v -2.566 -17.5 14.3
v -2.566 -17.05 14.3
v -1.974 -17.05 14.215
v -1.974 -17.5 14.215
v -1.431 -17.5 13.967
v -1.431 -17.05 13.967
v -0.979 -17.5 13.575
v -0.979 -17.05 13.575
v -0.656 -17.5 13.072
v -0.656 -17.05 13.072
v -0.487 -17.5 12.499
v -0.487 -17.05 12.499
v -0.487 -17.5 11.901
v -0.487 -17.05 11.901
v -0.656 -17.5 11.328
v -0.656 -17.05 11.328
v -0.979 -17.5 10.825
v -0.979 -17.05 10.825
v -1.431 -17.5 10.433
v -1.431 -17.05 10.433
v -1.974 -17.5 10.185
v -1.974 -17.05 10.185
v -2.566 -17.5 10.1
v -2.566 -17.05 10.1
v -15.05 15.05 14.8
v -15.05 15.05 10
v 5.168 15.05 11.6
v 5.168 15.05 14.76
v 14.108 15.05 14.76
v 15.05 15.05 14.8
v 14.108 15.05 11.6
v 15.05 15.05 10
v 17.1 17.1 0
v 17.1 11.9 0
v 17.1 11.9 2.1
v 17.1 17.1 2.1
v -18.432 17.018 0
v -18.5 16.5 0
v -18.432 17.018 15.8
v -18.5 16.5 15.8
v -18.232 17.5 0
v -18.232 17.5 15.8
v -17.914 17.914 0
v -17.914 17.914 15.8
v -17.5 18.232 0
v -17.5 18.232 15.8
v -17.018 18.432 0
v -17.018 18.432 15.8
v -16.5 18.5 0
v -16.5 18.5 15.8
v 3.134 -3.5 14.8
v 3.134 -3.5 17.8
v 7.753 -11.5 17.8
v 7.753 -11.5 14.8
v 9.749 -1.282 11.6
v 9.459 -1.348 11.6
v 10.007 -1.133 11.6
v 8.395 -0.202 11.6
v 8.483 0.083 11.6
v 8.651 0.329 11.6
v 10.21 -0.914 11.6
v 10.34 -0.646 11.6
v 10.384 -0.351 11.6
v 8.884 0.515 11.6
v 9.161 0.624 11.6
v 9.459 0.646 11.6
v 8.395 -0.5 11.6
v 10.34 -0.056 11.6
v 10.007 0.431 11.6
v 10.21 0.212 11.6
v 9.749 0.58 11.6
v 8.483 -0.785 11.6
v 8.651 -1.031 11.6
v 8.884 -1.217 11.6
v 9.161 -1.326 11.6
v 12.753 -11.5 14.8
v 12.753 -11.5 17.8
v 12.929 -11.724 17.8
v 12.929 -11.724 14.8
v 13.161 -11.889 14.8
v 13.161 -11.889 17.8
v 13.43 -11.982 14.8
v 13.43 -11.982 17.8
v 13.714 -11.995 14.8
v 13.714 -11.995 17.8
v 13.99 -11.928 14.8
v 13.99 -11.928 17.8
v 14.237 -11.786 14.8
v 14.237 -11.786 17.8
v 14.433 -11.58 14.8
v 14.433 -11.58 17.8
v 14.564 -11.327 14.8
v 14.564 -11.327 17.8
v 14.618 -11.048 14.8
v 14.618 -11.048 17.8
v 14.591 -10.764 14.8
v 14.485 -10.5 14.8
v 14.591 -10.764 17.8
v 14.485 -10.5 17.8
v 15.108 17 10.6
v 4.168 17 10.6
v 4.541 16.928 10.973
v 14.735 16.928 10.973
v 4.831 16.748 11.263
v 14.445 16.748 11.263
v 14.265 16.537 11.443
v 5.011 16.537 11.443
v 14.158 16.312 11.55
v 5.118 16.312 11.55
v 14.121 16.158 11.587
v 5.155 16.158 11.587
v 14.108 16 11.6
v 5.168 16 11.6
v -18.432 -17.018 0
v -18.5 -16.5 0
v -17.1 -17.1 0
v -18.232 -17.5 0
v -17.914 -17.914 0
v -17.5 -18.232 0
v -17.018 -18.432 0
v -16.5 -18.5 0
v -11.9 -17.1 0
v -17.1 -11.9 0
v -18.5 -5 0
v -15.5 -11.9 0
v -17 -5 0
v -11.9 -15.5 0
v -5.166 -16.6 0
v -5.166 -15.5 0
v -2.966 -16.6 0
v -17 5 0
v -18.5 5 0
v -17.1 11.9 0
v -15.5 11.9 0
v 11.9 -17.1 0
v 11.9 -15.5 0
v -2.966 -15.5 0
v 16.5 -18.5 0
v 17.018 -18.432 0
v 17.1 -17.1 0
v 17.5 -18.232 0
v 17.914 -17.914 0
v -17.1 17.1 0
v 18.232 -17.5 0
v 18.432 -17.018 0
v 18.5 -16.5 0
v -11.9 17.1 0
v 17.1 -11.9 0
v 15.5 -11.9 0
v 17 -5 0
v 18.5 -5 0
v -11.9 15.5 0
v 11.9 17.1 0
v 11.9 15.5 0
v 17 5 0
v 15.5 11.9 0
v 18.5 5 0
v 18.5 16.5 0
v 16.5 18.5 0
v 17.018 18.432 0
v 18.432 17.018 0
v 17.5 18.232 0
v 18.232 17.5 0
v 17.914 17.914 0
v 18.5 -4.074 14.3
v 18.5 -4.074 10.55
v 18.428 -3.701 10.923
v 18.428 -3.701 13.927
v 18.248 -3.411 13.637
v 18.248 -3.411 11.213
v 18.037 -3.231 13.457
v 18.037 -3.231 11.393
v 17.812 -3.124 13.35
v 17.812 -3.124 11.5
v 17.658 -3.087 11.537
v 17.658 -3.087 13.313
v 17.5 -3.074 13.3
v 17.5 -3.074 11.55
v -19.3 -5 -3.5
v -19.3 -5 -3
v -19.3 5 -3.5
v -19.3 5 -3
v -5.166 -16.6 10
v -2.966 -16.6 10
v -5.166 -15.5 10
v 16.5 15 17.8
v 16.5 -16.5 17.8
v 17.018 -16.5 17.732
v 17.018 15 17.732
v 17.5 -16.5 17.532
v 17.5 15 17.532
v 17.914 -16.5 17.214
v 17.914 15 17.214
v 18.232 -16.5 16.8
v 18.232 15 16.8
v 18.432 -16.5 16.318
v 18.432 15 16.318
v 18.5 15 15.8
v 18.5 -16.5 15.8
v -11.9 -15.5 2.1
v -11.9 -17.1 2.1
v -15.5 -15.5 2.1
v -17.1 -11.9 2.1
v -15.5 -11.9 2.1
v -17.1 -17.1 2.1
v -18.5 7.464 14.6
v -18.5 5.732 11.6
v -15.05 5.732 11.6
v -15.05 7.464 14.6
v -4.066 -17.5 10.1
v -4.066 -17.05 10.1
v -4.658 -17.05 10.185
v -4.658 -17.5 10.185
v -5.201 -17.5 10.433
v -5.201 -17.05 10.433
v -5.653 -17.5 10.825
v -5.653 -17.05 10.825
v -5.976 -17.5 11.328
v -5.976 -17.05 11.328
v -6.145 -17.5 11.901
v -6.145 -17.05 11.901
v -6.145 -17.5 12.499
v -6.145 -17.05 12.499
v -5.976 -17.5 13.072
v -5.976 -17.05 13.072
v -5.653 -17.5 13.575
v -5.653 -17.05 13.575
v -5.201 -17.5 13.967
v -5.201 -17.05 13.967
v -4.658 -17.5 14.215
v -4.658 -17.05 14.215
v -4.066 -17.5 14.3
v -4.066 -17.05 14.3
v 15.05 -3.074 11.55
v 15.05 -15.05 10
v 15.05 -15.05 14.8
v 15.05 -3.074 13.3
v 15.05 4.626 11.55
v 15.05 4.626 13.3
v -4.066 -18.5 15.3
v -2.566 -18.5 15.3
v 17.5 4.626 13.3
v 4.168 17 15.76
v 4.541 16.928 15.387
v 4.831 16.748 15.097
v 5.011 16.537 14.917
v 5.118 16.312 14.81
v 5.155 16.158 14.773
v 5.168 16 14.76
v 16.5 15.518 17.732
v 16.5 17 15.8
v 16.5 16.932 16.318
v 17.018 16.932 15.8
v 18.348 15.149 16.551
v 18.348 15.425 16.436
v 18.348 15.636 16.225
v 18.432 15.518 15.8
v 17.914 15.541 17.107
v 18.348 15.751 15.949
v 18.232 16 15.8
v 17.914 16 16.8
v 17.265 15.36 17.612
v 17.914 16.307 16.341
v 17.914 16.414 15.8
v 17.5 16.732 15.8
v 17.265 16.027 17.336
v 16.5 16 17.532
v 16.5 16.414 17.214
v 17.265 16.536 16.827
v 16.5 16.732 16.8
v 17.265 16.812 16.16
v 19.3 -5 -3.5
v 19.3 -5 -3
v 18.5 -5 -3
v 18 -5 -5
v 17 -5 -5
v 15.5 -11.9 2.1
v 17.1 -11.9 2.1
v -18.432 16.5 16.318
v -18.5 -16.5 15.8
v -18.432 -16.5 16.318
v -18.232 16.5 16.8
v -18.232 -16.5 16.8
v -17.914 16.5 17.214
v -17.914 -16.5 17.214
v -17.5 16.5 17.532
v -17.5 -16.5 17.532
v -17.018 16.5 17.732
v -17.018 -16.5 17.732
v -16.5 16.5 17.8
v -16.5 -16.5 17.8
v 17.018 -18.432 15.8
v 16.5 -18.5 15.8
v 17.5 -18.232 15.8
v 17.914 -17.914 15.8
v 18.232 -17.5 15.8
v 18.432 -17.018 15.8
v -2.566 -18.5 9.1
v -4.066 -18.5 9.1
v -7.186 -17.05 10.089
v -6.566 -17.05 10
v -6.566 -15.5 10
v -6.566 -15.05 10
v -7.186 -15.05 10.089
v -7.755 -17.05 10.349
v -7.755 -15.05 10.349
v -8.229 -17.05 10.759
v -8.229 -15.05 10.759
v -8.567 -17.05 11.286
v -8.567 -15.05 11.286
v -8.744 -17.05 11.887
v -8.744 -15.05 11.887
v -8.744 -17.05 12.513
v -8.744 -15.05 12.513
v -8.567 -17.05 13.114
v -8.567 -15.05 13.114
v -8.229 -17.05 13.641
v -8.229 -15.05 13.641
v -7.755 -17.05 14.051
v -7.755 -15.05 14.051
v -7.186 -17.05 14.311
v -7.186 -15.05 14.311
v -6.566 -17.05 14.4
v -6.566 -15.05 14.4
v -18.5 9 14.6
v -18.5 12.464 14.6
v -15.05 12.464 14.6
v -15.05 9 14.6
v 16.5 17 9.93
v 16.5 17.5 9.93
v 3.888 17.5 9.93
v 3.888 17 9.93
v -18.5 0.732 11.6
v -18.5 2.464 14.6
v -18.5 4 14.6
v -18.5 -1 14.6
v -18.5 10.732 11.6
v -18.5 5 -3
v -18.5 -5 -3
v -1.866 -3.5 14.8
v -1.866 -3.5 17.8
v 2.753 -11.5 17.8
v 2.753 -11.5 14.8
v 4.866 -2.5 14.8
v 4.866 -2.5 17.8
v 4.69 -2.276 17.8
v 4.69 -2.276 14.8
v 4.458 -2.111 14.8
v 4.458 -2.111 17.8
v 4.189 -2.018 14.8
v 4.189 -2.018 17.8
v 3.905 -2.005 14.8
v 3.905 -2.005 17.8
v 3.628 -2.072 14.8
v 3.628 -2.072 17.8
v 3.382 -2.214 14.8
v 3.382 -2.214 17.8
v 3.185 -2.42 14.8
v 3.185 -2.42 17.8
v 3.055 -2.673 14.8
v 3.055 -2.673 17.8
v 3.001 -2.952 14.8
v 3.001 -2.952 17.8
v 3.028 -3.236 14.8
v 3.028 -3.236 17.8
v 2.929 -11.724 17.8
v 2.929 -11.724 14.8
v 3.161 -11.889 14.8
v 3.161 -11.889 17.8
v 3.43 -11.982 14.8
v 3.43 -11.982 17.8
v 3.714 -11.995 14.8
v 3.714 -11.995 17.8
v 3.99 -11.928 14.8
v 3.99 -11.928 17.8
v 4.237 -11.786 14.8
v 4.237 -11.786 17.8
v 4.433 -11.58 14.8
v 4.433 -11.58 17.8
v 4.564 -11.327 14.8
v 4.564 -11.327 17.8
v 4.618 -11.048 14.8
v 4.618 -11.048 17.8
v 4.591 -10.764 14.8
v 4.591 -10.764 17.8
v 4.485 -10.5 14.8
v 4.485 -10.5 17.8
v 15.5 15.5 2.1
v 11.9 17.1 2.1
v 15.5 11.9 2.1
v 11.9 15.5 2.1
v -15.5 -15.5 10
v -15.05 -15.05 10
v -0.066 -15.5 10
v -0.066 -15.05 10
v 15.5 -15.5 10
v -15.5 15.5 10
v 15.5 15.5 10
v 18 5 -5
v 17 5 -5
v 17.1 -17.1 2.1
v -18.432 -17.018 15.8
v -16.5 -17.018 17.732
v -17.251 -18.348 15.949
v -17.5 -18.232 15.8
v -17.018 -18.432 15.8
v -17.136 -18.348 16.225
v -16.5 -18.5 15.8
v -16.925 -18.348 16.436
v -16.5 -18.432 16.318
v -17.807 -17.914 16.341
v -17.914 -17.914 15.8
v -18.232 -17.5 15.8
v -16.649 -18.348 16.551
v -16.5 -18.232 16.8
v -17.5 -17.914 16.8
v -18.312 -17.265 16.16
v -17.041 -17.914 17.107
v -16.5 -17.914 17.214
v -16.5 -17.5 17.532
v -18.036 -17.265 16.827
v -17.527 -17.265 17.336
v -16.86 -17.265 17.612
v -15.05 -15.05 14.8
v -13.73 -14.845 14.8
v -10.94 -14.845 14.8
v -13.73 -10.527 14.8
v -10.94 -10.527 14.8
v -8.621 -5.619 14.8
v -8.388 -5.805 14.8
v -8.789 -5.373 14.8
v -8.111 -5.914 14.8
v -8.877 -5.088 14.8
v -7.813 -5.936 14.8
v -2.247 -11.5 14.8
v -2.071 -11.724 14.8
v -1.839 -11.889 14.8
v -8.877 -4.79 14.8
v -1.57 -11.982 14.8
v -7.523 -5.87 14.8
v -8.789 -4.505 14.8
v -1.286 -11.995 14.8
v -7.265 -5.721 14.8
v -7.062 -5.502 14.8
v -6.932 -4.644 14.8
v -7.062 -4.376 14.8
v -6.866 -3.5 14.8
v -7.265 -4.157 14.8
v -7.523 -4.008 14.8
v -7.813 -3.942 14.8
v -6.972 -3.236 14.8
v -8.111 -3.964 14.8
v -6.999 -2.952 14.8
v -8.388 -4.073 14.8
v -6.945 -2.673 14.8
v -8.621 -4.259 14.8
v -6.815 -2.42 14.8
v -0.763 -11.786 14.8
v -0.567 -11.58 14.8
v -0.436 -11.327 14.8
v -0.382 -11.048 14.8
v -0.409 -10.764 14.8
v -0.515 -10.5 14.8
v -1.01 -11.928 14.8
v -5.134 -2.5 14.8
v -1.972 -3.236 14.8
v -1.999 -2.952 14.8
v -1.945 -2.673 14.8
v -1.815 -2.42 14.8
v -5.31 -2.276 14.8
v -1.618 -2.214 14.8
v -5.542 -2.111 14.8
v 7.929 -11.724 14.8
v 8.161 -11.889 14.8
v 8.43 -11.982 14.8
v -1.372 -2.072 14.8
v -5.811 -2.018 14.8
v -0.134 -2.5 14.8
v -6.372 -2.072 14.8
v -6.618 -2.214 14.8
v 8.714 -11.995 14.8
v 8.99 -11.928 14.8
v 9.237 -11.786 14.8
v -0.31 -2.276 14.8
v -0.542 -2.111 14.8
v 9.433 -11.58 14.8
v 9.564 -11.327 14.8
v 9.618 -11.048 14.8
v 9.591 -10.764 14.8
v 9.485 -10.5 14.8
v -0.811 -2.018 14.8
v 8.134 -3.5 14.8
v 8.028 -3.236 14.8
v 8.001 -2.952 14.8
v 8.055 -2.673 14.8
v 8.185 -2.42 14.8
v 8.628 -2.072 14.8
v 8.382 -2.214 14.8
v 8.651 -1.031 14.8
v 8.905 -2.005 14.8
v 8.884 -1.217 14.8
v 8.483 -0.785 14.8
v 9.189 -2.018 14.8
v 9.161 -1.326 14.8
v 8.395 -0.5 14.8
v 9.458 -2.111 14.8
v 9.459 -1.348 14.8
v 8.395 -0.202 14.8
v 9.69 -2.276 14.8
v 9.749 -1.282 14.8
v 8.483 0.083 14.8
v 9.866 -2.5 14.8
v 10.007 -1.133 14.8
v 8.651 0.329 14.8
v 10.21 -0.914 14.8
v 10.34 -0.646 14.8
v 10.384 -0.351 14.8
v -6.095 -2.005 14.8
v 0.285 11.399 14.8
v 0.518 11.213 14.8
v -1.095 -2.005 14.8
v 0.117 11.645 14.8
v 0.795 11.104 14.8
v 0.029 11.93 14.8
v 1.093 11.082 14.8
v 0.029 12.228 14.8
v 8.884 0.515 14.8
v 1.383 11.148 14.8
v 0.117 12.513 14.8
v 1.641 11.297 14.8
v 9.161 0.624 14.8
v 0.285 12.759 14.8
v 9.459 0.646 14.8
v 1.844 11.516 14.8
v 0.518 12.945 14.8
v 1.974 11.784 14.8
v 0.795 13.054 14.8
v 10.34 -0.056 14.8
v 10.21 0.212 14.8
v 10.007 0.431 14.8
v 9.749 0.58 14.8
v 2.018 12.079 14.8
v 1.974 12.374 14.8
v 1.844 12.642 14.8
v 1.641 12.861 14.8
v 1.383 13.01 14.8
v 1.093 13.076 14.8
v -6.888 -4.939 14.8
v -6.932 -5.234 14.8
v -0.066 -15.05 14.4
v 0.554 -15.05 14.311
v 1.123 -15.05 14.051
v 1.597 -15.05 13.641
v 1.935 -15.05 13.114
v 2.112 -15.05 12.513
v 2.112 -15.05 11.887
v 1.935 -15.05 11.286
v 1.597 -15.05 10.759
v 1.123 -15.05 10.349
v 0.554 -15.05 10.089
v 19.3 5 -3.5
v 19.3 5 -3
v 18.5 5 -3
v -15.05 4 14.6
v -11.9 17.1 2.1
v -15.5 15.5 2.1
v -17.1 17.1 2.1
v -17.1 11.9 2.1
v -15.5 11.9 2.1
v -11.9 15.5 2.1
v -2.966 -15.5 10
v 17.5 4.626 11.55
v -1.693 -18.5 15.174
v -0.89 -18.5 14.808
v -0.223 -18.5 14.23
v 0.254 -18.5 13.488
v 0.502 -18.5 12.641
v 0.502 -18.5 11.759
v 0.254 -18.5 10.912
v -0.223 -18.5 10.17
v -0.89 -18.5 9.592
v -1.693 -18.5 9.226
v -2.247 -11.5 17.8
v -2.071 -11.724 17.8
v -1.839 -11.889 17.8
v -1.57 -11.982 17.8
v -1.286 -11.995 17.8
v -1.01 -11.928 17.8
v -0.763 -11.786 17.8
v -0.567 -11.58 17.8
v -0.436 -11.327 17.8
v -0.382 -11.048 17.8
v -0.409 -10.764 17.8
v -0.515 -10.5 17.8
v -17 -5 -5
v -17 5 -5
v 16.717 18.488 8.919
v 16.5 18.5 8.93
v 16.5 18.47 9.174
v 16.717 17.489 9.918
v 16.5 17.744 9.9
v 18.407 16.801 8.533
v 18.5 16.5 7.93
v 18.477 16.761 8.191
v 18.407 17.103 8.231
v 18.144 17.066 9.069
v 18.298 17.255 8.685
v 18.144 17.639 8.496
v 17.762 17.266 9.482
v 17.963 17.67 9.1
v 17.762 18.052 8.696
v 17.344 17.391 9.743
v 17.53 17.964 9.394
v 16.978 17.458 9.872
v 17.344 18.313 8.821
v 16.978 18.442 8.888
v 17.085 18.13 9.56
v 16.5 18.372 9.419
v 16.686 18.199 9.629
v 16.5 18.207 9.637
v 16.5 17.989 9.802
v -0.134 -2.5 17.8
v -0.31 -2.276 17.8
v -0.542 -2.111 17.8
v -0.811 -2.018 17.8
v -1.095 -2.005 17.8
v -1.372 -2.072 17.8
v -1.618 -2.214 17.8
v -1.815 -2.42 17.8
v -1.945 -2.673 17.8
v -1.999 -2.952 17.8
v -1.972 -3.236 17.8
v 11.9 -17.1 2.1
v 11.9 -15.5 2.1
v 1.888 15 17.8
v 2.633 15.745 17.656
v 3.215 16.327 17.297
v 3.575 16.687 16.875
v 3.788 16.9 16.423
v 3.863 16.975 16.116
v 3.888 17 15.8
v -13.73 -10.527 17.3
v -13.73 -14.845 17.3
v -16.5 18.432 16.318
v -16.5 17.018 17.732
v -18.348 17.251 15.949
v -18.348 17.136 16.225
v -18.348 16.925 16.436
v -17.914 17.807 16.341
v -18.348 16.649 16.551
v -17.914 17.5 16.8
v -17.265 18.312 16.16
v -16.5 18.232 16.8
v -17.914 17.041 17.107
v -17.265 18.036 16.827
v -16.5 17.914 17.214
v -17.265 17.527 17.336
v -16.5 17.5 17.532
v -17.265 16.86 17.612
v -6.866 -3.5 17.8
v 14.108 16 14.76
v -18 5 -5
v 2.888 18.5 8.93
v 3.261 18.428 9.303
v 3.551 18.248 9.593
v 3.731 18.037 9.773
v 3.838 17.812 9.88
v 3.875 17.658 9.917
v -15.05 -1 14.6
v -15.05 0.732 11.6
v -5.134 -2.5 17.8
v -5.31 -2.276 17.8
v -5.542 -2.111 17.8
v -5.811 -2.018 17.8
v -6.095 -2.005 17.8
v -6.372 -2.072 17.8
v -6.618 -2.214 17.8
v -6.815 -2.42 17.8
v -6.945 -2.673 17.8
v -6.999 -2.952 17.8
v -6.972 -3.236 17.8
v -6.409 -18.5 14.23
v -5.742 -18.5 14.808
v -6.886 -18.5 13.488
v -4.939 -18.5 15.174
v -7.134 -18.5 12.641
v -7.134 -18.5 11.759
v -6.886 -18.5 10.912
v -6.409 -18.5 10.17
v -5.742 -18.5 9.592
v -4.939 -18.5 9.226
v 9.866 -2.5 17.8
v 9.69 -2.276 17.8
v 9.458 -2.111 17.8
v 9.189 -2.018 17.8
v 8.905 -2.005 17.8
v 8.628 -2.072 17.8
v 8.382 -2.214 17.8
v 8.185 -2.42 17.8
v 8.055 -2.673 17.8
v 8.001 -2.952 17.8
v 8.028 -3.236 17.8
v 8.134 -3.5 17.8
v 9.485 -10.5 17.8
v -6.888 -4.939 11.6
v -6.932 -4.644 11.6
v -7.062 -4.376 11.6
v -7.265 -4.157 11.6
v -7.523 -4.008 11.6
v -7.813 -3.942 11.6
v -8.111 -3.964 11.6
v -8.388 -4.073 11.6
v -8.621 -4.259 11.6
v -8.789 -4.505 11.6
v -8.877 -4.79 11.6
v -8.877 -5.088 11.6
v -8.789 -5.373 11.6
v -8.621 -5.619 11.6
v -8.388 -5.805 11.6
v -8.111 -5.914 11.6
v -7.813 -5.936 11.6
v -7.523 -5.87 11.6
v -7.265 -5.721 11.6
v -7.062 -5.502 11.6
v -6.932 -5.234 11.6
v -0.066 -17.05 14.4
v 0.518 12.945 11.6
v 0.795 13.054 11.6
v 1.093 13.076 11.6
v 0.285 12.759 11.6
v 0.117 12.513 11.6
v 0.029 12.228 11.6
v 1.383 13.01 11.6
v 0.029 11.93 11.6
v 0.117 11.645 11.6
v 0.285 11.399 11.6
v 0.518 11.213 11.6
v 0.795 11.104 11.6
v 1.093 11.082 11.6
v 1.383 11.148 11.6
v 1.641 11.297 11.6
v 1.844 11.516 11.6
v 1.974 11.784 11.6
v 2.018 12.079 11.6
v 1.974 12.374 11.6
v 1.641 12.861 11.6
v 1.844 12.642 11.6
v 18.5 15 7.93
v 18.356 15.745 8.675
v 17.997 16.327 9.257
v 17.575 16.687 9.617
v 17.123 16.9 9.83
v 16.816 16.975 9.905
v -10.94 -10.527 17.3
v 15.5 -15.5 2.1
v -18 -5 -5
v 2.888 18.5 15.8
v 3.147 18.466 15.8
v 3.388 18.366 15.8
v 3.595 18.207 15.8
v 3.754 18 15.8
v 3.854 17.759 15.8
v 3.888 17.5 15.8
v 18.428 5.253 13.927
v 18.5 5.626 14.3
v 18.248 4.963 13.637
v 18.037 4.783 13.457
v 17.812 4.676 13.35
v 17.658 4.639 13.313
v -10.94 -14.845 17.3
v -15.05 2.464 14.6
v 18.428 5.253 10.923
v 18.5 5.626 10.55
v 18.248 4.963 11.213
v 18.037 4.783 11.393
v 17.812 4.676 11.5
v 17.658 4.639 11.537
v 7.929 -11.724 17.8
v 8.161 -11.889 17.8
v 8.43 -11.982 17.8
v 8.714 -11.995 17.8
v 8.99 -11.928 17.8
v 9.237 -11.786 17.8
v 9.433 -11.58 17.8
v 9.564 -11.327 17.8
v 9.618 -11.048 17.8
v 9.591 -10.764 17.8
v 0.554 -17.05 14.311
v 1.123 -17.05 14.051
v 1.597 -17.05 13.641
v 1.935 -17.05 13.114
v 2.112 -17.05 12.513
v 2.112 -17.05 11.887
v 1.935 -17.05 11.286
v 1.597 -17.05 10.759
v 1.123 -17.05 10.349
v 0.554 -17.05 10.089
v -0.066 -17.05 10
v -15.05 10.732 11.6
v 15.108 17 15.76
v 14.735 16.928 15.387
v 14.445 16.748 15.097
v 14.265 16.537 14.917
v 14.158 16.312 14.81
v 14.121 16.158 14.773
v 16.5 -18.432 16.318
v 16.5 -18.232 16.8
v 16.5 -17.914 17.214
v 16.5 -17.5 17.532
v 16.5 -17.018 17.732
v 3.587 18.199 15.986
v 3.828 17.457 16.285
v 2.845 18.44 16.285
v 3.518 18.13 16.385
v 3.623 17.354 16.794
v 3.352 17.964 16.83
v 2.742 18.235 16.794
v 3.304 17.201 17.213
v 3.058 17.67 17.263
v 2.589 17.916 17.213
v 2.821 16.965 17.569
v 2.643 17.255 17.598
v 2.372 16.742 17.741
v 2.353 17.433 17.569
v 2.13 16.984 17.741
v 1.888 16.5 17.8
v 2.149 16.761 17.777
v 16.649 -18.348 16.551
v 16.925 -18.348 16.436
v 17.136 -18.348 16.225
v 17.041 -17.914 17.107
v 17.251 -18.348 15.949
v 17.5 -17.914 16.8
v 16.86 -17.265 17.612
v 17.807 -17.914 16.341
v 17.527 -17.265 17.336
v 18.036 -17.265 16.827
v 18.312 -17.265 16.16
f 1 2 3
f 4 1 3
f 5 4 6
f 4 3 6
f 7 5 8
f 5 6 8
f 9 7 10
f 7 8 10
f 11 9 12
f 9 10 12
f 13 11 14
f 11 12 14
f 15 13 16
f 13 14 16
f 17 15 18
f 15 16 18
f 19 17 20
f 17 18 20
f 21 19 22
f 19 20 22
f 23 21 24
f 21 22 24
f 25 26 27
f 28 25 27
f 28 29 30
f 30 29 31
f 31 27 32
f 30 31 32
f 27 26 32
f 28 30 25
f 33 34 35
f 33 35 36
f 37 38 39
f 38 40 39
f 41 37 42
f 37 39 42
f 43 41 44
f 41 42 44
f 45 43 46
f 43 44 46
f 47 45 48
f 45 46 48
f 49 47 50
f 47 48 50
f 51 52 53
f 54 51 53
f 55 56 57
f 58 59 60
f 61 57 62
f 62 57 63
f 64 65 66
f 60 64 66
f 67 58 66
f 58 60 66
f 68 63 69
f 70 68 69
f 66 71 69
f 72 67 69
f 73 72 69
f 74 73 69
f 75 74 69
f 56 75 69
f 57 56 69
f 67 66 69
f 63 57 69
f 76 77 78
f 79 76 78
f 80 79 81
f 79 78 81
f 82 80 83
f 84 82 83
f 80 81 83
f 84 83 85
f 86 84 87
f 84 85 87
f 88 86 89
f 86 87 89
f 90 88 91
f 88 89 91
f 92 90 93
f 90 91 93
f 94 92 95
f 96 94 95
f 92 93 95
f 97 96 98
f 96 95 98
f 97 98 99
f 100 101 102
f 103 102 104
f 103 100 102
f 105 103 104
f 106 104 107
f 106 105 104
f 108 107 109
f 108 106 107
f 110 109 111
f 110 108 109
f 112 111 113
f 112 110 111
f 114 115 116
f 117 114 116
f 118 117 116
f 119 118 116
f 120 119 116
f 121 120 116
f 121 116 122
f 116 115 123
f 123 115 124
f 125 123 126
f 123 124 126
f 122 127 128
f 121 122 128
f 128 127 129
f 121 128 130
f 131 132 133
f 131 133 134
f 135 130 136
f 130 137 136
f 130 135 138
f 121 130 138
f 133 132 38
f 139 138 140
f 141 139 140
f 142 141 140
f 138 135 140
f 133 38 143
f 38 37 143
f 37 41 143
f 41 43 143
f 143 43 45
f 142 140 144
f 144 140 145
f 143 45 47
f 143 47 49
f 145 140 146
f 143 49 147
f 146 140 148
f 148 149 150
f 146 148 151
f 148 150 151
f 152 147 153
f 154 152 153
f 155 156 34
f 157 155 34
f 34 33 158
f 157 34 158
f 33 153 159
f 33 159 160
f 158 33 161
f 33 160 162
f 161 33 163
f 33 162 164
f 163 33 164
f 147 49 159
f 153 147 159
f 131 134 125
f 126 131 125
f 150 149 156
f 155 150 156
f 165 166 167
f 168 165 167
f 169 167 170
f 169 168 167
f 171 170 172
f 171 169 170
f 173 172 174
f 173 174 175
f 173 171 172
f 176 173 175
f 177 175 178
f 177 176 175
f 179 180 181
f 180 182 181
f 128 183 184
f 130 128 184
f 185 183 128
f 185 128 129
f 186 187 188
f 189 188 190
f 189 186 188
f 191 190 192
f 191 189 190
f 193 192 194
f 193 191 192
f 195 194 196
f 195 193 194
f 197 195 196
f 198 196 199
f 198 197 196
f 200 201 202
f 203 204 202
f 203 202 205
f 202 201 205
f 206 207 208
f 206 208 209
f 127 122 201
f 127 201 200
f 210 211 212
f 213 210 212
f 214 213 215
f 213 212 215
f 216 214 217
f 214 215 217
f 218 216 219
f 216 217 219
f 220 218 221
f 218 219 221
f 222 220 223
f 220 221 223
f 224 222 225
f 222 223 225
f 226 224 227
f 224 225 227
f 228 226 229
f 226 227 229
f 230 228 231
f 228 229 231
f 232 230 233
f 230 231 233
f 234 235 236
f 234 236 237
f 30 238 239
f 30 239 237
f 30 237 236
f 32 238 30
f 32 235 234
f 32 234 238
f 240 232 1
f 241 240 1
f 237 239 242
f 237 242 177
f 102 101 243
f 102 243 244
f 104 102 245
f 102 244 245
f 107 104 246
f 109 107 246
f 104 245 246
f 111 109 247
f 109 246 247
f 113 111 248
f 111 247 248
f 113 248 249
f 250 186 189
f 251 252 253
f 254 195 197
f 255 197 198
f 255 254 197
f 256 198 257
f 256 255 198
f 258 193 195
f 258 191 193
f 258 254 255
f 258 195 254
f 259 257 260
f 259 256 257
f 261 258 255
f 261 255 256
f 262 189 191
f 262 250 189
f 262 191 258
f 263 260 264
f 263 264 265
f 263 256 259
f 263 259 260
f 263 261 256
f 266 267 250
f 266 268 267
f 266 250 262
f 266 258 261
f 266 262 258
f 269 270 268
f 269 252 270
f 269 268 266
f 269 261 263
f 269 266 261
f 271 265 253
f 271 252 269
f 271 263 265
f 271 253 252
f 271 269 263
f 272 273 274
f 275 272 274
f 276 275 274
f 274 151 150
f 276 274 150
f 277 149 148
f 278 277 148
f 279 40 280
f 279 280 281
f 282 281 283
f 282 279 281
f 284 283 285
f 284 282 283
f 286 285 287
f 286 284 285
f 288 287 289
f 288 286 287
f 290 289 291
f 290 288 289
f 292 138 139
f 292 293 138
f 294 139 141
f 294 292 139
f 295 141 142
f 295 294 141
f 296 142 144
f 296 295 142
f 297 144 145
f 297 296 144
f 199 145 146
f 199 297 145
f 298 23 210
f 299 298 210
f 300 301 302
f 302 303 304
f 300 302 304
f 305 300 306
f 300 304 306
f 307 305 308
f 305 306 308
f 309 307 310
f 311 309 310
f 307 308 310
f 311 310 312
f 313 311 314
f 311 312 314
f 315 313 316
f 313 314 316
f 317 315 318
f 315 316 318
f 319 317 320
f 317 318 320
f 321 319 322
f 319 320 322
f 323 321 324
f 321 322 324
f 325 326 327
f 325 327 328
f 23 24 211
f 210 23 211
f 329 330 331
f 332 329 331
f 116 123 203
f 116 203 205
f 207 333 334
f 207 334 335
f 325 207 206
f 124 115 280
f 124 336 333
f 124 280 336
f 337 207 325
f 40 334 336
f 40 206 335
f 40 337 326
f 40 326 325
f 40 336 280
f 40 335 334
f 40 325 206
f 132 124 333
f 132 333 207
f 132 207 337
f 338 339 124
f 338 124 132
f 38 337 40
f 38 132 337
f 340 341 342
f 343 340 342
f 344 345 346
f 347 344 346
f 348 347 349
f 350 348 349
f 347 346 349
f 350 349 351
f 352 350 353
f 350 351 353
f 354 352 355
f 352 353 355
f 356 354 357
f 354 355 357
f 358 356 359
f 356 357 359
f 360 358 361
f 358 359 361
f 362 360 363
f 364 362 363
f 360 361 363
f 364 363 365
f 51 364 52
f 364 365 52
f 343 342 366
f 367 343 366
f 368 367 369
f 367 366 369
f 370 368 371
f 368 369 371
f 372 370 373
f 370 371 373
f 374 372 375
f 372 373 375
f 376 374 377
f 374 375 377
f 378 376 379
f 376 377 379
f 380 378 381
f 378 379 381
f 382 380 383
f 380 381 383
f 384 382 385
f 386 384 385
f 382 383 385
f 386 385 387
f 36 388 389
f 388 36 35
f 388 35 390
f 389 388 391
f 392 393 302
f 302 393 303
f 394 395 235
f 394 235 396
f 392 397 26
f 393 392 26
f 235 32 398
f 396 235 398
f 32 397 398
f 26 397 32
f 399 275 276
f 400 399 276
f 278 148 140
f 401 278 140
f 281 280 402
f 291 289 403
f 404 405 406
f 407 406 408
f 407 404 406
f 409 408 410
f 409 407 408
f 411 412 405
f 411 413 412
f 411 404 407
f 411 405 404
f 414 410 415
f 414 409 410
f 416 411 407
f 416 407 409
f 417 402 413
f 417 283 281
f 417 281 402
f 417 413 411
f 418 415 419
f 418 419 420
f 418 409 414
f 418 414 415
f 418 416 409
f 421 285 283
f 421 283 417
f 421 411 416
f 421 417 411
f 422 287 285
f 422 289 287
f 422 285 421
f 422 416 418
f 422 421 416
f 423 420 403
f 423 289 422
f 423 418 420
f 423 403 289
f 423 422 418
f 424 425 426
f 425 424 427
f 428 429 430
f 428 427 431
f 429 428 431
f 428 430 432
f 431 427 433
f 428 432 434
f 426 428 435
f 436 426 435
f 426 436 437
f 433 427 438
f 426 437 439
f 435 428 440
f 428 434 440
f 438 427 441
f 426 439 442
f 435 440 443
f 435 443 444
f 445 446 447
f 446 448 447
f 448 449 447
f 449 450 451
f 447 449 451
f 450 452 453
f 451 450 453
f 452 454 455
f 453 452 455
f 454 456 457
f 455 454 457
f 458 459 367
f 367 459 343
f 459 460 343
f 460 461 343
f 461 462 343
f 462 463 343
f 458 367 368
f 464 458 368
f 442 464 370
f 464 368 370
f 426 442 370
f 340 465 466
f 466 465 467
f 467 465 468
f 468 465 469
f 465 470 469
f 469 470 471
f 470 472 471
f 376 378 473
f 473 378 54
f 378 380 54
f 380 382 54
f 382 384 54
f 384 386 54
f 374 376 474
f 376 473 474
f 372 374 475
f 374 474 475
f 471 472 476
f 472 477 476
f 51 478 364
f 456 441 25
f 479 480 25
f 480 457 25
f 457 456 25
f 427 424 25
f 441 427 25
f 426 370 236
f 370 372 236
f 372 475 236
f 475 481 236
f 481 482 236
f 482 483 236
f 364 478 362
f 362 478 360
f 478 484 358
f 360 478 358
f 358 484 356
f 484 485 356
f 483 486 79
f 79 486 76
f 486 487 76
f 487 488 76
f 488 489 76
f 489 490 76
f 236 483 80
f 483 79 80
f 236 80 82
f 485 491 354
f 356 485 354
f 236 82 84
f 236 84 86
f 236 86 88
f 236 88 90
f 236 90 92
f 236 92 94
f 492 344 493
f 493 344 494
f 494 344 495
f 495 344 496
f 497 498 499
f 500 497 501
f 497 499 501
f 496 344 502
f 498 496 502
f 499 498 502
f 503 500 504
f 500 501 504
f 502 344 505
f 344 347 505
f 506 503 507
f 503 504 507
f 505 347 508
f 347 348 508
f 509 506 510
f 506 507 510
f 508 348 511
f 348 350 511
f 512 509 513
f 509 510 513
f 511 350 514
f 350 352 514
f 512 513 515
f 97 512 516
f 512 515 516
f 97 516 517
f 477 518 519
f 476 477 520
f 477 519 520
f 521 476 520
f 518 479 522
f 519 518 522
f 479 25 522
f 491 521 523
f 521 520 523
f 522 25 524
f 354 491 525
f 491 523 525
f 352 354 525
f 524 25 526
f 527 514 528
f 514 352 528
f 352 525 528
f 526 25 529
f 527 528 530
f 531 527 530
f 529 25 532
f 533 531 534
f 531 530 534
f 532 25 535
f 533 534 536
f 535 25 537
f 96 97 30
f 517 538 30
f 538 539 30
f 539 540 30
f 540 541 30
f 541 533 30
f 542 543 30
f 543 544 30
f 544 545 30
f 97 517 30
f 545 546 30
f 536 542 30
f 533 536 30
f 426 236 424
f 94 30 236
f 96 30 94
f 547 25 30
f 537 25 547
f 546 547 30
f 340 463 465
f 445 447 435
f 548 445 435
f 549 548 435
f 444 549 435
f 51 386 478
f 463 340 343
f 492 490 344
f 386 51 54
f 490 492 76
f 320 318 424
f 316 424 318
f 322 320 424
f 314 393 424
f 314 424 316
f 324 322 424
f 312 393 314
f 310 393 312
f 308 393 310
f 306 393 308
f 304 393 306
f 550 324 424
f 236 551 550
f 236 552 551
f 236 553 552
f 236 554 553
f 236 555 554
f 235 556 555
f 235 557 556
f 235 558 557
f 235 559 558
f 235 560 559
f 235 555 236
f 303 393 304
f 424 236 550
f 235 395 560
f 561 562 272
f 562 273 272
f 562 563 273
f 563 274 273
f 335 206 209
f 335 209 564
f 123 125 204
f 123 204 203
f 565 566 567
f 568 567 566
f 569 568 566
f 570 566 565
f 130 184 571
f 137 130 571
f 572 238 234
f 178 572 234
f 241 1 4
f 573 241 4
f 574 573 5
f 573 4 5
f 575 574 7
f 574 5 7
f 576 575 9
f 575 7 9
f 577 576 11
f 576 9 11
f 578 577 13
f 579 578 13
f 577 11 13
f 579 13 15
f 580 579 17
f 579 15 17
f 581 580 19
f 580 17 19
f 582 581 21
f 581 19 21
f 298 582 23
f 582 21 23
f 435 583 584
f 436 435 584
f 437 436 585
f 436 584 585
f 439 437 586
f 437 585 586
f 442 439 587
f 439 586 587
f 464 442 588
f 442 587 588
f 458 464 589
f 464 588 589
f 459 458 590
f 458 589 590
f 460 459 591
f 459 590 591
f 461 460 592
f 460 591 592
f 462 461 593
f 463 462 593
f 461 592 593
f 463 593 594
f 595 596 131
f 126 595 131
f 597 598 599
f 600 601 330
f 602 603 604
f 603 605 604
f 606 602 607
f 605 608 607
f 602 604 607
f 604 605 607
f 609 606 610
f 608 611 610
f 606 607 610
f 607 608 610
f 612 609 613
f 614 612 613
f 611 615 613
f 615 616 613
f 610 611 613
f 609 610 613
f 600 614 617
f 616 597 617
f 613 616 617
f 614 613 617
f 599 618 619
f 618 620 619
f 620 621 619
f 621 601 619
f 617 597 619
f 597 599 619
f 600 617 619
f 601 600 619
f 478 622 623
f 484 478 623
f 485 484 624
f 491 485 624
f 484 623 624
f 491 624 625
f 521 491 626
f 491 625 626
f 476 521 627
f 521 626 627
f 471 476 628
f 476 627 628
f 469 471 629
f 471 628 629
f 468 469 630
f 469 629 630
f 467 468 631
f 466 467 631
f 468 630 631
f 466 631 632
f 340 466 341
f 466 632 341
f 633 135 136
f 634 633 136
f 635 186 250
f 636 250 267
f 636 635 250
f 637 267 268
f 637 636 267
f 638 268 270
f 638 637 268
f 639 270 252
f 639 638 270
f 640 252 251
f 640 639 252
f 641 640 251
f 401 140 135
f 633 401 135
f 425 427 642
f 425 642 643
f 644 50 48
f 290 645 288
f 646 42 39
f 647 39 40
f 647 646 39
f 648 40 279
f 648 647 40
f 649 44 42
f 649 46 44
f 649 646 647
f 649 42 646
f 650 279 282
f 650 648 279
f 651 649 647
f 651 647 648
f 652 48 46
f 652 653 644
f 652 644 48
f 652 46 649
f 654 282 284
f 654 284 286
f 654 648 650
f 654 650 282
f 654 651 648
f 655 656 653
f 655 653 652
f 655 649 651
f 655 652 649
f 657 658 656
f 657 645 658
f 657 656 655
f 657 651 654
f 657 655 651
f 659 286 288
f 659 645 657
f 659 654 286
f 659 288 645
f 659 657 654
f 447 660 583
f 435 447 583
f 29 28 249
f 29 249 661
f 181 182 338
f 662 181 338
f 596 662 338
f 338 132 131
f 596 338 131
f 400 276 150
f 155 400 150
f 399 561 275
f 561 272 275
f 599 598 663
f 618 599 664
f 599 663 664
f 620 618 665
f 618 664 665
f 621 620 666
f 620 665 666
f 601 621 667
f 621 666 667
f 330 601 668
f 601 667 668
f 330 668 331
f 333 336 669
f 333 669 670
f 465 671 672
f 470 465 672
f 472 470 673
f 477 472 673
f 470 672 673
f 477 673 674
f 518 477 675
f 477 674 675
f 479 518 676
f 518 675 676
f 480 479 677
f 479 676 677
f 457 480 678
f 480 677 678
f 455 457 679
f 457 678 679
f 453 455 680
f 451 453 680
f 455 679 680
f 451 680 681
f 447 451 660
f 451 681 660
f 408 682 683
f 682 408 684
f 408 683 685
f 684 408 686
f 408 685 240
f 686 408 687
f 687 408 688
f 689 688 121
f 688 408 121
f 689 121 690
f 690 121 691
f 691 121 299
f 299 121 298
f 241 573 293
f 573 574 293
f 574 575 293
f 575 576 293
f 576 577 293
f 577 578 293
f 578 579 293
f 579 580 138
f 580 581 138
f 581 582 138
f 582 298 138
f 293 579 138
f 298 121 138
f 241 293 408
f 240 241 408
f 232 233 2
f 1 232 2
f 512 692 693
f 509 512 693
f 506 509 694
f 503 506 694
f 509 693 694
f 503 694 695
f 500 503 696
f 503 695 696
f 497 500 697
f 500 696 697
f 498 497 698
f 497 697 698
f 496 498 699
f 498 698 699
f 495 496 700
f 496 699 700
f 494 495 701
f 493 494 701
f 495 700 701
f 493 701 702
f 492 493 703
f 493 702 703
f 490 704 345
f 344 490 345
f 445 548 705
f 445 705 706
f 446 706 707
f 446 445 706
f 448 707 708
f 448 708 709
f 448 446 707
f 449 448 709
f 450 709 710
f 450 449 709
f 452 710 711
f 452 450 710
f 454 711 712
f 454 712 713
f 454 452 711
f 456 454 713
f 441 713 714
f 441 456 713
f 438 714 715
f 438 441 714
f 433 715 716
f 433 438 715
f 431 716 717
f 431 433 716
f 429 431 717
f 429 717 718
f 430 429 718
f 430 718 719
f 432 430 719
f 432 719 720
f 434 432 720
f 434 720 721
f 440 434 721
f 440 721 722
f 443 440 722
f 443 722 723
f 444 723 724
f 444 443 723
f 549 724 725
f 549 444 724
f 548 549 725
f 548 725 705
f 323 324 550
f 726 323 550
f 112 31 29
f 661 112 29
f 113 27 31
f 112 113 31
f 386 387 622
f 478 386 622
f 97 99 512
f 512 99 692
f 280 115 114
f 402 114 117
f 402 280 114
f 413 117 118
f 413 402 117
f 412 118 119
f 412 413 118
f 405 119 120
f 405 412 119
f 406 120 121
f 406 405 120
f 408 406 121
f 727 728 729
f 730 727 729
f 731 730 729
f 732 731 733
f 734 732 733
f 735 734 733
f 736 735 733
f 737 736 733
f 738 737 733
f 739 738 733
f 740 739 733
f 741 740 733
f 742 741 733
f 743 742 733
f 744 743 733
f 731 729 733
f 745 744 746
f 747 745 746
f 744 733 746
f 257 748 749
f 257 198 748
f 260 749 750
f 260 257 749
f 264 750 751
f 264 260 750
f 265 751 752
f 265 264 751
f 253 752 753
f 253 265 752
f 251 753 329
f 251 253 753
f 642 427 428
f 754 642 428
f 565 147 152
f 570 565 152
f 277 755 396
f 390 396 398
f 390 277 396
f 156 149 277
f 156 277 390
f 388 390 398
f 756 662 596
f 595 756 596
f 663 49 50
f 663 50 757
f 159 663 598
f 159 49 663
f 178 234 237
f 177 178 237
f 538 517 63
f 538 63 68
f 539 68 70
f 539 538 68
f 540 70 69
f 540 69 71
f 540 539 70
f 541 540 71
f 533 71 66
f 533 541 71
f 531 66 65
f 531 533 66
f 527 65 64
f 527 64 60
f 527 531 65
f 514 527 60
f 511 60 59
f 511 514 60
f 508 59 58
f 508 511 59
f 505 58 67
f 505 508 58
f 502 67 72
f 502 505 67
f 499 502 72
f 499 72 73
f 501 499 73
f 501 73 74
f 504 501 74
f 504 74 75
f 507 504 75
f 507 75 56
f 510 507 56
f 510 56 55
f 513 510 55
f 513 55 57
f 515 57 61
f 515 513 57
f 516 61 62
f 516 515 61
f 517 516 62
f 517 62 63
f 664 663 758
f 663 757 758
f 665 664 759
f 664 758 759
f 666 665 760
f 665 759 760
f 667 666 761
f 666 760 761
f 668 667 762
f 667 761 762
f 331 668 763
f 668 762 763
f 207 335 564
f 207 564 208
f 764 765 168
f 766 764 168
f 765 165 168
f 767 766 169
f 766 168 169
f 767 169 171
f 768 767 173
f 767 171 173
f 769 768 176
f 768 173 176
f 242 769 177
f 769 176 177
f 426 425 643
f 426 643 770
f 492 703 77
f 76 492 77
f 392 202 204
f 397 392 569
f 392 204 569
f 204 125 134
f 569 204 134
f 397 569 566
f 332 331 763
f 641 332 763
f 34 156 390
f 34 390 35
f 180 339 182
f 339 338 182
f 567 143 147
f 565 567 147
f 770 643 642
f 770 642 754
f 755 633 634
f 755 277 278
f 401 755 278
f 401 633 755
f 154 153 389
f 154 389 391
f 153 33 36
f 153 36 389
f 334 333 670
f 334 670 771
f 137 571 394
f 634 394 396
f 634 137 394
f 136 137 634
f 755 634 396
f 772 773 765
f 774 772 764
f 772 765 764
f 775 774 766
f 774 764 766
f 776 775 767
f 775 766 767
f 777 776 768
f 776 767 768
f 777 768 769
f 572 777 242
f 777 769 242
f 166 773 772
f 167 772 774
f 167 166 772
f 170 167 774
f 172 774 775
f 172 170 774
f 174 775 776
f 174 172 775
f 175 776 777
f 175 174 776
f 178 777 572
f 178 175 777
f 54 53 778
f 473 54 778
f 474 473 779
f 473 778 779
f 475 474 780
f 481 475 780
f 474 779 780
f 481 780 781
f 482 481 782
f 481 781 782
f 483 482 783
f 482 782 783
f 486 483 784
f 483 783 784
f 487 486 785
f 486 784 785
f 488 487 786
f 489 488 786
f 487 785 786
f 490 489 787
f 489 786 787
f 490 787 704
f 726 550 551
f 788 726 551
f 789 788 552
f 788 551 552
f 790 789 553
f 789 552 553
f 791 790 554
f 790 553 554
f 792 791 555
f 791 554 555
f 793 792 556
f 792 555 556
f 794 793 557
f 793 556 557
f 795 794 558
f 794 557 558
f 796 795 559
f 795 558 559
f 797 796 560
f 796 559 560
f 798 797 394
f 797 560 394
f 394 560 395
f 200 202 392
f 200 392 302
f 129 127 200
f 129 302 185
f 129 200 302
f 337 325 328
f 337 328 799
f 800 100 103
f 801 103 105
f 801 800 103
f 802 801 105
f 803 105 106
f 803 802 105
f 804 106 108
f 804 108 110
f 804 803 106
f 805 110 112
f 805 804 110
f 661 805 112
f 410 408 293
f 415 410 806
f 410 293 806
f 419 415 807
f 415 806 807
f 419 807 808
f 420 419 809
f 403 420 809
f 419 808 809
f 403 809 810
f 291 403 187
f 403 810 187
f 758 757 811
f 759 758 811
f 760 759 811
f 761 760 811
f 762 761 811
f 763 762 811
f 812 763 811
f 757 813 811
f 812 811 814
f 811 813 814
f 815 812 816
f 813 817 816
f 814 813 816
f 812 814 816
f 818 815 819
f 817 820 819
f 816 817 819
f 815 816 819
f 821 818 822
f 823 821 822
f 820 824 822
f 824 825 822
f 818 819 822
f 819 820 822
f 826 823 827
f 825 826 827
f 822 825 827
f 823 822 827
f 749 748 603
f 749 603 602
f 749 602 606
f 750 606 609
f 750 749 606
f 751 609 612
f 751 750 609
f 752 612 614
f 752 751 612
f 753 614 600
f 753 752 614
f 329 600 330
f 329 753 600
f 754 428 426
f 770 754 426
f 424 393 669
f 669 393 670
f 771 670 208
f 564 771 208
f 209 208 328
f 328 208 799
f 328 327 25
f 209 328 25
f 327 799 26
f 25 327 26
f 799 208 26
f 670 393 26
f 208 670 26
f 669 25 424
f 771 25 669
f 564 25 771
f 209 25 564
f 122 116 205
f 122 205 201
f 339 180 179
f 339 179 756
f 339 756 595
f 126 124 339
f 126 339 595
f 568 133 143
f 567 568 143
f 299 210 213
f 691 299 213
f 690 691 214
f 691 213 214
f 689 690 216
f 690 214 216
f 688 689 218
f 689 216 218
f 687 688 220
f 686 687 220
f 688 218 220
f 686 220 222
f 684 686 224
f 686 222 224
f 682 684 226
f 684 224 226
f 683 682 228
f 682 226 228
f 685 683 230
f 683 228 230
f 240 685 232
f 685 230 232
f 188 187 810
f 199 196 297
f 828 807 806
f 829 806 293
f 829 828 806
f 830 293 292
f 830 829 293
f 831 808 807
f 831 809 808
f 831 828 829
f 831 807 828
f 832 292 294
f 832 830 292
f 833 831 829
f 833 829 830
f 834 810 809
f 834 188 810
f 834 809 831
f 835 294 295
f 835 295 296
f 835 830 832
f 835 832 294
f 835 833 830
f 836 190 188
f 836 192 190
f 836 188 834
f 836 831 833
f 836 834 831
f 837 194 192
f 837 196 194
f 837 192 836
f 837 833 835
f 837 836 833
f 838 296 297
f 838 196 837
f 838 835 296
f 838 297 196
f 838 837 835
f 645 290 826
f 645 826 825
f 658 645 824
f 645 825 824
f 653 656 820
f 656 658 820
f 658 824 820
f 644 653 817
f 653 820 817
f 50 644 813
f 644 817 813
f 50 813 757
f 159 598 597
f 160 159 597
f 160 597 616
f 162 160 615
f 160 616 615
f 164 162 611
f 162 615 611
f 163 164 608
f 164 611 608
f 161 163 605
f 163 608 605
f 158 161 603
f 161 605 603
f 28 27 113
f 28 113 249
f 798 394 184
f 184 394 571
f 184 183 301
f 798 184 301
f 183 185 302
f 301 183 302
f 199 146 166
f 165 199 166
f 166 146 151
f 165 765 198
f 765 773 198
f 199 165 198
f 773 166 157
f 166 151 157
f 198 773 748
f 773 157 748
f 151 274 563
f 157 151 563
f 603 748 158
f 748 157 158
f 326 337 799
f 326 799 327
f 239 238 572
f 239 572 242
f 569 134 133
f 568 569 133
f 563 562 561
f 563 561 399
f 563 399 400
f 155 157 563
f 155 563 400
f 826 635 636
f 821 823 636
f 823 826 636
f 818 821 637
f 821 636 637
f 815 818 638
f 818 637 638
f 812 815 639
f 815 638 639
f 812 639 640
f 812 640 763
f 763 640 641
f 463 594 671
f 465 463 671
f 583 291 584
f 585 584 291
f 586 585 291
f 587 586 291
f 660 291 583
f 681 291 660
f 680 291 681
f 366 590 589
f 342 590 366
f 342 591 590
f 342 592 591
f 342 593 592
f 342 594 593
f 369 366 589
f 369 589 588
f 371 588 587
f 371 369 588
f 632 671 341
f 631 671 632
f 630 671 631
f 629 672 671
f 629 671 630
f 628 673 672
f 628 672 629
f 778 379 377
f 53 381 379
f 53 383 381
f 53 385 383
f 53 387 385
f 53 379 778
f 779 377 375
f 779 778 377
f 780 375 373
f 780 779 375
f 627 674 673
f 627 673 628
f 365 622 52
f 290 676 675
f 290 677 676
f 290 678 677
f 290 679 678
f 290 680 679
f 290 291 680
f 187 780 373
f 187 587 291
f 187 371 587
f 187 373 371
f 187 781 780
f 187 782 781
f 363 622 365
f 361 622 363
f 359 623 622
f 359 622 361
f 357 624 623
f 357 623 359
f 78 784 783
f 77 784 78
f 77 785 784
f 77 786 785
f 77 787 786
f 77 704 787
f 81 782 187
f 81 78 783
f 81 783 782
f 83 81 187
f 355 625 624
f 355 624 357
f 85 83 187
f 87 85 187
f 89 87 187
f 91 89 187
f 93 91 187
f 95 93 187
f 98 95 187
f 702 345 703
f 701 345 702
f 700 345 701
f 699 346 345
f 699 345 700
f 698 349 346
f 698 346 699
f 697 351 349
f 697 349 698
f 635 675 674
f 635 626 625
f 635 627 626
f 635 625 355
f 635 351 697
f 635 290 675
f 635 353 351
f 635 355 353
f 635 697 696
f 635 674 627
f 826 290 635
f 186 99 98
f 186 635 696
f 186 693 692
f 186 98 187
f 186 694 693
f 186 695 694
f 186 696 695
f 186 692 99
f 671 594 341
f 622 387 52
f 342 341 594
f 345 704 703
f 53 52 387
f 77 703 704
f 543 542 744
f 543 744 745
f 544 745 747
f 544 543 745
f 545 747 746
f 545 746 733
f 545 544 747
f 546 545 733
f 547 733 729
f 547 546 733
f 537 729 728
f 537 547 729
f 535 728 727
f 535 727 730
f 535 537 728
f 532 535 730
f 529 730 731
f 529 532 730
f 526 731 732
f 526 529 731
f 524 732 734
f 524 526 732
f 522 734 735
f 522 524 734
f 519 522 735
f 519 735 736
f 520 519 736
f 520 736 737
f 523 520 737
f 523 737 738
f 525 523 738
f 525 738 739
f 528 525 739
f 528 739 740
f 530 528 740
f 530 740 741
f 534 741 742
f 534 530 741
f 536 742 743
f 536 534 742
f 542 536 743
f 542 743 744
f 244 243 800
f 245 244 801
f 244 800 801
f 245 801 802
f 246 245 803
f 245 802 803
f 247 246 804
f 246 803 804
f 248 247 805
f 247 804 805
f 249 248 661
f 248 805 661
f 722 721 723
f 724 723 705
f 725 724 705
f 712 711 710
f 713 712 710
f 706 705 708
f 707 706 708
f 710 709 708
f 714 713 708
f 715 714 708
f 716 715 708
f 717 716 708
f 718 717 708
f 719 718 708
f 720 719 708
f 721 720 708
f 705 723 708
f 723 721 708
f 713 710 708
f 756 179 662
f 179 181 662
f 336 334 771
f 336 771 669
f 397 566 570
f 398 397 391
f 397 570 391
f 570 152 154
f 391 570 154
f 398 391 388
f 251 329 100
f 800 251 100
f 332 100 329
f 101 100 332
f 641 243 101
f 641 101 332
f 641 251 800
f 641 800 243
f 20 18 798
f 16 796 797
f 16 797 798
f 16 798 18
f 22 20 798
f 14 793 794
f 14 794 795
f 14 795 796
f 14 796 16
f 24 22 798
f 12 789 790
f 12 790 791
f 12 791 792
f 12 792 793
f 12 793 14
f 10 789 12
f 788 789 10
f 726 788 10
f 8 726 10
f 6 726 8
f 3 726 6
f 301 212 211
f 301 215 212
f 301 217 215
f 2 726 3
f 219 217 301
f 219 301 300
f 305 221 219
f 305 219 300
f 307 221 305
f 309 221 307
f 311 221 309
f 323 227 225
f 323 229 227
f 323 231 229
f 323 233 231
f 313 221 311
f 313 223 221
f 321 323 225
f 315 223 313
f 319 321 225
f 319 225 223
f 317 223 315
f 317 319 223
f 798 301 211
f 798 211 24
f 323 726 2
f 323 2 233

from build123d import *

# Parameters (mm, degrees)
SKETCH_W        = 37
SKETCH_H        = 37
PAD_DEPTH       = 17.8
SKETCH001_W     = 30.1
SKETCH001_H     = 30.1
POCKET_DEPTH    = 14.8
SKETCH002_R     = 1
PAD001_DEPTH    = 3.2
SKETCH003_W     = 31
SKETCH003_H     = 31
POCKET001_DEPTH = 10
SKETCH004_W     = 2.2
SKETCH004_H     = 1.6
POCKET002_DEPTH = 10
POCKET003_DEPTH = 2
POCKET004_DEPTH = 1.5
SKETCH011_W     = 8.94
SKETCH011_H     = 3.16
POCKET007_DEPTH = 3.5
SKETCH012_W     = 14.612
SKETCH012_H     = 7.87
POCKET008_DEPTH = 1.5
SKETCH013_W     = 7.7
SKETCH013_H     = 1.75
POCKET009_DEPTH = 3.5
PAD005_DEPTH    = 5
POCKET014_DEPTH = 2.1
SKETCH021_W     = 2.79
SKETCH021_H     = 4.318
POCKET013_DEPTH = 2.5
POCKET011_DEPTH = 3
POCKET012_DEPTH = 3.5
FILLET006_R     = 2
CHAMFER_SIZE    = 1
FILLET007_R     = 1
FILLET008_R     = 1


with BuildPart() as part:
    # Sketch → Pad (new body)
    with BuildSketch(Plane.XY):
        Rectangle(SKETCH_W, SKETCH_H)
    extrude(amount=PAD_DEPTH)

    # Sketch001 → Pocket (cut)
    with BuildSketch(Plane.XY):
        Rectangle(SKETCH001_W, SKETCH001_H)
    extrude(amount=POCKET_DEPTH, mode=Mode.SUBTRACT)

    # Sketch002 (on Face11 of Pocket) → Pad001 (join)
    with BuildSketch(Plane.XY.offset(14.8)):
        with Locations((1.018, 12.079)):
            Circle(SKETCH002_R)
        with Locations((9.384, -0.351)):
            Circle(SKETCH002_R)
        with Locations((-7.888, -4.939)):
            Circle(SKETCH002_R)
    extrude(amount=-PAD001_DEPTH)

    # Sketch003 → Pocket001 (cut)
    with BuildSketch(Plane.XY):
        Rectangle(SKETCH003_W, SKETCH003_H)
    extrude(amount=POCKET001_DEPTH, mode=Mode.SUBTRACT)

    # Sketch004 → Pocket002 (cut)
    with BuildSketch(Plane.XY):
        with Locations((-4.066, -15.8)):
            Rectangle(SKETCH004_W, SKETCH004_H)
    extrude(amount=POCKET002_DEPTH, mode=Mode.SUBTRACT)

    # Sketch005 (on Face16 of Pocket002) → Pocket003 (cut)
    with BuildSketch(Plane(origin=(0, -15.05, 0), x_dir=(-1, 0, 0), z_dir=(0, 1, 0))):
        with BuildLine():
            ThreePointArc((0.066, 14.4), (-2.134, 12.2), (0.066, 10))
            Line((0.066, 10), (6.566, 10))
            ThreePointArc((6.566, 10), (8.766, 12.2), (6.566, 14.4))
            Line((6.566, 14.4), (0.066, 14.4))
        make_face()
    extrude(amount=-POCKET003_DEPTH, mode=Mode.SUBTRACT)

    # Sketch006 (on Face18 of Pocket003) → Pocket004 (cut)
    with BuildSketch(Plane(origin=(0, -17.05, 0), x_dir=(-1, 0, 0), z_dir=(0, 1, 0))):
        with BuildLine():
            ThreePointArc((2.566, 14.3), (0.466, 12.2), (2.566, 10.1))
            Line((2.566, 10.1), (4.066, 10.1))
            ThreePointArc((4.066, 10.1), (6.166, 12.2), (4.066, 14.3))
            Line((4.066, 14.3), (2.566, 14.3))
        make_face()
    extrude(amount=-POCKET004_DEPTH, mode=Mode.SUBTRACT)

    # Sketch011 (on Face26 of Pocket004) → Pocket007 (cut)
    with BuildSketch(Plane.XZ.offset(-15.05)):
        with Locations((9.638, 13.18)):
            Rectangle(SKETCH011_W, SKETCH011_H)
    extrude(amount=-POCKET007_DEPTH, mode=Mode.SUBTRACT)

    # Sketch012 (on Face1 of Pocket007) → Pocket008 (cut)
    with BuildSketch(Plane(origin=(0, 18.5, 0), x_dir=(-1, 0, 0), z_dir=(0, 1, 0))):
        with Locations((-11.194, 13.865)):
            Rectangle(SKETCH012_W, SKETCH012_H)
    extrude(amount=-POCKET008_DEPTH, mode=Mode.SUBTRACT)

    # Sketch013 (on Face34 of Pocket008) → Pocket009 (cut)
    with BuildSketch(Plane(origin=(15.05, 0, 0), x_dir=(0, -1, 0), z_dir=(-1, 0, 0))):
        with Locations((-0.776, 12.425)):
            Rectangle(SKETCH013_W, SKETCH013_H)
    extrude(amount=-POCKET009_DEPTH, mode=Mode.SUBTRACT)

    # Sketch015 → Pad005 (join, symmetric)
    with BuildSketch(Plane.XZ):
        Polygon((-17, 0), (-18.5, 0), (-18.5, -3), (-19.3, -3), (-19.3, -3.5), (-18, -5), (-17, -5), align=None)
        Polygon((17, 0), (18.5, 0), (18.5, -3), (19.3, -3), (19.3, -3.5), (18, -5), (17, -5), align=None)
    extrude(amount=PAD005_DEPTH, both=True)

    # Sketch022 (on Face2 of Pad005) → Pocket014 (cut)
    with BuildSketch(Plane(origin=(0, 0, 0), x_dir=(1, 0, 0), z_dir=(0, 0, -1))):
        Polygon((-17.1, 17.1), (-11.9, 17.1), (-11.9, 15.5), (-15.5, 15.5), (-15.5, 11.9), (-17.1, 11.9), align=None)
        Polygon((17.1, 17.1), (11.9, 17.1), (11.9, 15.5), (15.5, 15.5), (15.5, 11.9), (17.1, 11.9), align=None)
        Polygon((-17.1, -17.1), (-11.9, -17.1), (-11.9, -15.5), (-15.5, -15.5), (-15.5, -11.9), (-17.1, -11.9), align=None)
        Polygon((17.1, -17.1), (11.9, -17.1), (11.9, -15.5), (15.5, -15.5), (15.5, -11.9), (17.1, -11.9), align=None)
    extrude(amount=-POCKET014_DEPTH, mode=Mode.SUBTRACT)

    # Sketch021 (on Face51 of Pad005) → Pocket013 (cut)
    with BuildSketch(Plane(origin=(0, 0, 14.8), x_dir=(1, 0, 0), z_dir=(0, 0, -1))):
        with Locations((-12.335, 12.686)):
            Rectangle(SKETCH021_W, SKETCH021_H)
    extrude(amount=-POCKET013_DEPTH, mode=Mode.SUBTRACT)

    # Sketch019 (on Face6 of Pocket013) → Pocket011 (cut)
    with BuildSketch(Plane.XY.offset(17.8)):
        with BuildLine():
            ThreePointArc((-5.133975, -2.5), (-6.5, -2.133975), (-6.866025, -3.5))
            Line((-6.866025, -3.5), (-2.247223, -11.5))
            ThreePointArc((-2.247223, -11.5), (-0.881198, -11.866025), (-0.515172, -10.5))
            Line((-0.515172, -10.5), (-5.133975, -2.5))
        make_face()
        with BuildLine():
            ThreePointArc((-0.133975, -2.5), (-1.5, -2.133975), (-1.866025, -3.5))
            Line((-1.866025, -3.5), (2.752777, -11.5))
            ThreePointArc((2.752777, -11.5), (4.118802, -11.866025), (4.484828, -10.5))
            Line((4.484828, -10.5), (-0.133975, -2.5))
        make_face()
        with BuildLine():
            ThreePointArc((4.866025, -2.5), (3.5, -2.133975), (3.133975, -3.5))
            Line((3.133975, -3.5), (7.752777, -11.5))
            ThreePointArc((7.752777, -11.5), (9.118802, -11.866025), (9.484828, -10.5))
            Line((9.484828, -10.5), (4.866025, -2.5))
        make_face()
        with BuildLine():
            ThreePointArc((9.866025, -2.5), (8.5, -2.133975), (8.133975, -3.5))
            Line((8.133975, -3.5), (12.752777, -11.5))
            ThreePointArc((12.752777, -11.5), (14.118802, -11.866025), (14.484828, -10.5))
            Line((14.484828, -10.5), (9.866025, -2.5))
        make_face()
    extrude(amount=-POCKET011_DEPTH, mode=Mode.SUBTRACT)

    # Sketch020 (on Face7 of Pocket011) → Pocket012 (cut)
    with BuildSketch(Plane(origin=(-18.5, 0, 0), x_dir=(0, -1, 0), z_dir=(-1, 0, 0))):
        Polygon((-2.464102, 14.6), (1, 14.6), (-0.732051, 11.6), align=None)
        Polygon((-7.464102, 14.6), (-4, 14.6), (-5.732051, 11.6), align=None)
        Polygon((-12.464102, 14.6), (-9, 14.6), (-10.732051, 11.6), align=None)
    extrude(amount=-POCKET012_DEPTH, mode=Mode.SUBTRACT)

    # Fillet006
    fillet006_edges = [part.edges().sort_by_distance(p)[0] for p in [
        (11.194, 17, 17.8),
        (3.888, 17.75, 17.8),
        (-7.306, 18.5, 17.8),
        (18.5, -0.75, 17.8),
        (18.5, 17, 13.865),
        (18.5, 17.75, 9.93),
        (18.5, 18.5, 4.965),
        (-18.5, 18.5, 8.9),
        (-18.5, 0, 17.8),
        (-18.5, -18.5, 8.9),
        (0, -18.5, 17.8),
        (18.5, -18.5, 8.9),
    ]]
    fillet(fillet006_edges, radius=FILLET006_R)

    # Chamfer
    chamfer_edges = [part.edges().sort_by_distance(p)[0] for p in [
        (-3.316, -18.5, 14.3),
    ]]
    chamfer(chamfer_edges, length=CHAMFER_SIZE)

    # Fillet007
    fillet007_edges = [part.edges().sort_by_distance(p)[0] for p in [
        (10.194, 18.5, 9.93),
        (3.888, 18.5, 12.865),
        (5.168, 17, 13.18),
        (9.638, 17, 11.6),
        (14.108, 17, 13.18),
        (9.638, 17, 14.76),
        (3.180098, 17.792098, 17.326592),
        (18.026592, 17.792098, 9.222098),
    ]]
    fillet(fillet007_edges, radius=FILLET007_R)

    # Fillet008
    fillet008_edges = [part.edges().sort_by_distance(p)[0] for p in [
        (18.5, 0.776, 13.3),
        (18.5, -3.074, 12.425),
        (18.5, 0.776, 11.55),
        (18.5, 4.626, 12.425),
    ]]
    fillet(fillet008_edges, radius=FILLET008_R)


solid = part.part
